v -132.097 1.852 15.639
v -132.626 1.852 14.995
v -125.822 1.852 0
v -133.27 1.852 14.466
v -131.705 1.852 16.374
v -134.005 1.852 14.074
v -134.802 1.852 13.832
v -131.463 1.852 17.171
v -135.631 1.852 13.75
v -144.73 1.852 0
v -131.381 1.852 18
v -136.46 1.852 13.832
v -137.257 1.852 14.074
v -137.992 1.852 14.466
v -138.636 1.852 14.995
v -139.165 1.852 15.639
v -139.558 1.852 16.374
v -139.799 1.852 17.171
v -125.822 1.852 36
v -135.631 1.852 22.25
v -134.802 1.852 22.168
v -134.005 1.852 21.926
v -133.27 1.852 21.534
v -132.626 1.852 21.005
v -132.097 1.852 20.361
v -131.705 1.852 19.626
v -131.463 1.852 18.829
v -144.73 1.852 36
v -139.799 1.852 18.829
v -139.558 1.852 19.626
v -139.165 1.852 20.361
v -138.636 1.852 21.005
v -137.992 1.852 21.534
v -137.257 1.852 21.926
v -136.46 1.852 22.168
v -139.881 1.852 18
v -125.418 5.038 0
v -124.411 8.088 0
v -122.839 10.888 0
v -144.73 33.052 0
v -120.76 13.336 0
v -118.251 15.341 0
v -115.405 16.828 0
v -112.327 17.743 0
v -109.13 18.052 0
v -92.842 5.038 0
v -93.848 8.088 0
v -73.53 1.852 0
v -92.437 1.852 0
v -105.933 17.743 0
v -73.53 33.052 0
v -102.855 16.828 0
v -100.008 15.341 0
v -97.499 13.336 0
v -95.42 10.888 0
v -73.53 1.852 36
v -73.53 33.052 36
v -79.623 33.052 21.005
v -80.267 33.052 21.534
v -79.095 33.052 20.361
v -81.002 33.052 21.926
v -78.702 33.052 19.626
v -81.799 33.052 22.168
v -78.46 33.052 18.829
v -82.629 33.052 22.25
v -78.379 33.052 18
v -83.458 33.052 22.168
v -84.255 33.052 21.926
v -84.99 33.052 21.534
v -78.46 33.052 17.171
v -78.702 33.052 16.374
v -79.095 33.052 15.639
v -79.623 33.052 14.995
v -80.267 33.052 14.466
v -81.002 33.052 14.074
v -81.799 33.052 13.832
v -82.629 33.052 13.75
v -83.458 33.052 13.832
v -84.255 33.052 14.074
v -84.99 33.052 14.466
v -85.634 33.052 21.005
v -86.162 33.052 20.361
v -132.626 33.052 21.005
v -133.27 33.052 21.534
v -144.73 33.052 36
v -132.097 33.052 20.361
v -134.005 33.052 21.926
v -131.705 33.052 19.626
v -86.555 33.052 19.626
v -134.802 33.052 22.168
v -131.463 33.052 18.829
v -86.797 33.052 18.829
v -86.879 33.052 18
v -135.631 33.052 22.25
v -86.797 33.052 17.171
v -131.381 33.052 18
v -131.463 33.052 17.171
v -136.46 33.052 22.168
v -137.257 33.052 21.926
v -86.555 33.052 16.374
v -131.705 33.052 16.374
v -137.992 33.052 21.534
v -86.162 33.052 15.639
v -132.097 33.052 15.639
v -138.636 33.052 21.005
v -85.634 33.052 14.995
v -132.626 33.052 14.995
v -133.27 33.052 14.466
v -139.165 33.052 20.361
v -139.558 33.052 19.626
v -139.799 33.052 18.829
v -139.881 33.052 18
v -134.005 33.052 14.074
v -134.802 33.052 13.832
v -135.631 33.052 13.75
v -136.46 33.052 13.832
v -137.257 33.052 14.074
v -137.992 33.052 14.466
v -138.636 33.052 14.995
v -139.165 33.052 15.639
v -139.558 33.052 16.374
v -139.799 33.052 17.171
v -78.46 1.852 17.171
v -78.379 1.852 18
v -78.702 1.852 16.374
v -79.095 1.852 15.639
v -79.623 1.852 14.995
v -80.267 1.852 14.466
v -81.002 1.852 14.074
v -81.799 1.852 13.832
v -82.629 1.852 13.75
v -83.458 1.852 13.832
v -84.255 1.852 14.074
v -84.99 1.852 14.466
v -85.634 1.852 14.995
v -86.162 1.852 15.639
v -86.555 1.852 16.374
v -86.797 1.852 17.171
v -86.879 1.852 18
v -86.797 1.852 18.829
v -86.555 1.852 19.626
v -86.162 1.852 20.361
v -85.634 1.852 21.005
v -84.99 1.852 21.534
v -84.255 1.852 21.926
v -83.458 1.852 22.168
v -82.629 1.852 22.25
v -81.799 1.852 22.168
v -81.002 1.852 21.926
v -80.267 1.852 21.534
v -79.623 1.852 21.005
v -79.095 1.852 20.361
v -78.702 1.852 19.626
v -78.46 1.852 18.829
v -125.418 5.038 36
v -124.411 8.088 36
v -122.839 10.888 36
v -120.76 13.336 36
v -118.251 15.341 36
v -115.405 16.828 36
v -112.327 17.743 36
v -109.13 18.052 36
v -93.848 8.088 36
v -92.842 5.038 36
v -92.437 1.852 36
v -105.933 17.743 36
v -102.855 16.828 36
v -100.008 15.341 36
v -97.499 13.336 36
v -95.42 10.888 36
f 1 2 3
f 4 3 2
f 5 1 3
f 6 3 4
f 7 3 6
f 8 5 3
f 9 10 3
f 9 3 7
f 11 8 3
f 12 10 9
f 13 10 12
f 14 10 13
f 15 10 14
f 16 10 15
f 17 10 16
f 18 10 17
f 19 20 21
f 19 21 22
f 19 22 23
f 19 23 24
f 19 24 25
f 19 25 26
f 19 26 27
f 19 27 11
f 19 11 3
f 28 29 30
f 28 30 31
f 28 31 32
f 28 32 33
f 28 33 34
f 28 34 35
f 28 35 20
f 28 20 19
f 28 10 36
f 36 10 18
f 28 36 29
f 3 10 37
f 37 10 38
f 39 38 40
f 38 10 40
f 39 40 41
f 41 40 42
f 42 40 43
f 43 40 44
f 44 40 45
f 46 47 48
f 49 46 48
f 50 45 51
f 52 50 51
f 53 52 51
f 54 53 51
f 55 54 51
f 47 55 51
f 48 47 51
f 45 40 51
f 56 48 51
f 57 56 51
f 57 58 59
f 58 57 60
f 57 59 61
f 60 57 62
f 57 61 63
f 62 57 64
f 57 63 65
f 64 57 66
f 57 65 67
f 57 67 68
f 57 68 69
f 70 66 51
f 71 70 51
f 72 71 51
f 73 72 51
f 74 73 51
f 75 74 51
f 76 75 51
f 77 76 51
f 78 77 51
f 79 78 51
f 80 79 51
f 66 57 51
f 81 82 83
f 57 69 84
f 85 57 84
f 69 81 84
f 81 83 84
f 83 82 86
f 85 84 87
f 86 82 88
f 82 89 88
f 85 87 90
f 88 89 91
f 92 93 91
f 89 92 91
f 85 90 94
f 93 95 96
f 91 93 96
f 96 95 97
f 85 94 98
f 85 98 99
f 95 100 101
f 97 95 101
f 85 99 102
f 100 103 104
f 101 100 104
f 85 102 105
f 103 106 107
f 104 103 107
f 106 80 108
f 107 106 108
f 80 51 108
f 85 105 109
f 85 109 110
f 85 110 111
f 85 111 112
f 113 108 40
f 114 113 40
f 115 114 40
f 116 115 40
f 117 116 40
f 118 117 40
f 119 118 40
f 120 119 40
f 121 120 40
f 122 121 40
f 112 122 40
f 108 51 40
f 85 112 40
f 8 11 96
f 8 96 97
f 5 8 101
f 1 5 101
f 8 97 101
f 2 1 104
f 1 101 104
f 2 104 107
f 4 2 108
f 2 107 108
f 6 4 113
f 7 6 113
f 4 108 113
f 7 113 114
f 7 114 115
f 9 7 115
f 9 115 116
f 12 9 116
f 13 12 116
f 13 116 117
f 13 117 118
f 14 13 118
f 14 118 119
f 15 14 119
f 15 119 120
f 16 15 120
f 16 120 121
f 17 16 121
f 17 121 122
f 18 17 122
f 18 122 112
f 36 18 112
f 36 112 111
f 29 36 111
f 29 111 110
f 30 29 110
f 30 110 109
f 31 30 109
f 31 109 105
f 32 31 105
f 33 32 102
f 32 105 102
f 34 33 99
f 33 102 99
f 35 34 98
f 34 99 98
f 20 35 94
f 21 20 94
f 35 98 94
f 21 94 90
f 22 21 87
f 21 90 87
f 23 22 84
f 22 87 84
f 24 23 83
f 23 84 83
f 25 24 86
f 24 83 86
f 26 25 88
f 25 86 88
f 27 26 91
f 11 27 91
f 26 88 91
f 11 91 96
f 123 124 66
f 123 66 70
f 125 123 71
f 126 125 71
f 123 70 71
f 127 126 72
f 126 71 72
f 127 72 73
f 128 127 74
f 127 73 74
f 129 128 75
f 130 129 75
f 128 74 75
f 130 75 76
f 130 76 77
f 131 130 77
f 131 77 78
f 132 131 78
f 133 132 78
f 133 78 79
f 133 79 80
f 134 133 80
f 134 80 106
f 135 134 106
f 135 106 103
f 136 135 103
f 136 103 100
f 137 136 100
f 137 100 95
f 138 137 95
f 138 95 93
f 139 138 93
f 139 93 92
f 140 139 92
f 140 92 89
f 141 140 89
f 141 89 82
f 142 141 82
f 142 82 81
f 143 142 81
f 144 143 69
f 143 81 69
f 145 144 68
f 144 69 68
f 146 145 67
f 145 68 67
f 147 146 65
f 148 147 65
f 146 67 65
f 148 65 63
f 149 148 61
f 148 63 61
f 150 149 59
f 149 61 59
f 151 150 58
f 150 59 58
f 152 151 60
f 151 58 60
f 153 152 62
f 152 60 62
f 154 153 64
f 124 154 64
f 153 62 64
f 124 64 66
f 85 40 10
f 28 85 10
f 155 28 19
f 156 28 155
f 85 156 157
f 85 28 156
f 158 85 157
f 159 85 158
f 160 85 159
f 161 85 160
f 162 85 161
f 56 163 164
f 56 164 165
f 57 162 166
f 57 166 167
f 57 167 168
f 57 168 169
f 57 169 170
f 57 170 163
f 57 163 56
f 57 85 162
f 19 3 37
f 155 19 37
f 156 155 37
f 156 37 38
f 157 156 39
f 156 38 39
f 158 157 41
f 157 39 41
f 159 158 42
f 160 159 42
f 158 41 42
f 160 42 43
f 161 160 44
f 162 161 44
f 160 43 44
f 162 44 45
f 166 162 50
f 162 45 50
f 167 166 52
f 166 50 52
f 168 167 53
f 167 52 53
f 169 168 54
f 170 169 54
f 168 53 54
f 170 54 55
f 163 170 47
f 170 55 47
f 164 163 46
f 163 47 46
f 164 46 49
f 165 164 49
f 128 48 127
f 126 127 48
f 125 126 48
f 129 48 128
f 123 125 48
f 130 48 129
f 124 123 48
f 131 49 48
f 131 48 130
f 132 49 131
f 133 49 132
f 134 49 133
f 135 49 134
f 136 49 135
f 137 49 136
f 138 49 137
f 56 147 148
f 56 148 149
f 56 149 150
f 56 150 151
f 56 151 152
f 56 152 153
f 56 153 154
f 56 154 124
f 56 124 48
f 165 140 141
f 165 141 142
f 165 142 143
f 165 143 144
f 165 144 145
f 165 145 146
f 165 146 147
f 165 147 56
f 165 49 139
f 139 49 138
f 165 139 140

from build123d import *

# Parameters (mm, degrees)
BOSS_EXTRUDE1_DEPTH = 36
SKETCH2_R           = 4.25
CUT_EXTRUDE1_DEPTH  = 32.7
SKETCH3_W           = 36
SKETCH3_H           = 0.5
CUT_EXTRUDE2_DEPTH  = 72.2


with BuildPart() as part:
    # Sketch1 → Boss-Extrude1 (new body)
    with BuildSketch(Plane.XY):
        with BuildLine():
            Line((-73.529829319, 33.051903281), (-144.729829319, 33.051903281))
            Line((-144.729829319, 33.051903281), (-144.729829319, 1.351903281))
            Line((-144.729829319, 1.351903281), (-125.829829319, 1.351903281))
            ThreePointArc((-125.829829319, 1.351903281), (-109.129829319, 18.051903281), (-92.429829319, 1.351903281))
            Line((-92.429829319, 1.351903281), (-73.529829319, 1.351903281))
            Line((-73.529829319, 1.351903281), (-73.529829319, 33.051903281))
        make_face()
    extrude(amount=BOSS_EXTRUDE1_DEPTH)

    # Sketch2 → Cut-Extrude1 (cut, through all)
    with BuildSketch(Plane(origin=(0, 33.051903281, 0), x_dir=(1, 0, 0), z_dir=(0, 1, 0))):
        with Locations((-82.628590119, -18)):
            Circle(SKETCH2_R)
        with Locations((-135.631068518, -18)):
            Circle(SKETCH2_R)
    extrude(amount=-CUT_EXTRUDE1_DEPTH, mode=Mode.SUBTRACT)

    # Sketch3 → Cut-Extrude2 (cut, through all)
    with BuildSketch(Plane.ZY.offset(144.729829319)):
        with Locations((18, 1.601903281)):
            Rectangle(SKETCH3_W, SKETCH3_H)
    extrude(amount=-CUT_EXTRUDE2_DEPTH, mode=Mode.SUBTRACT)


solid = part.part
